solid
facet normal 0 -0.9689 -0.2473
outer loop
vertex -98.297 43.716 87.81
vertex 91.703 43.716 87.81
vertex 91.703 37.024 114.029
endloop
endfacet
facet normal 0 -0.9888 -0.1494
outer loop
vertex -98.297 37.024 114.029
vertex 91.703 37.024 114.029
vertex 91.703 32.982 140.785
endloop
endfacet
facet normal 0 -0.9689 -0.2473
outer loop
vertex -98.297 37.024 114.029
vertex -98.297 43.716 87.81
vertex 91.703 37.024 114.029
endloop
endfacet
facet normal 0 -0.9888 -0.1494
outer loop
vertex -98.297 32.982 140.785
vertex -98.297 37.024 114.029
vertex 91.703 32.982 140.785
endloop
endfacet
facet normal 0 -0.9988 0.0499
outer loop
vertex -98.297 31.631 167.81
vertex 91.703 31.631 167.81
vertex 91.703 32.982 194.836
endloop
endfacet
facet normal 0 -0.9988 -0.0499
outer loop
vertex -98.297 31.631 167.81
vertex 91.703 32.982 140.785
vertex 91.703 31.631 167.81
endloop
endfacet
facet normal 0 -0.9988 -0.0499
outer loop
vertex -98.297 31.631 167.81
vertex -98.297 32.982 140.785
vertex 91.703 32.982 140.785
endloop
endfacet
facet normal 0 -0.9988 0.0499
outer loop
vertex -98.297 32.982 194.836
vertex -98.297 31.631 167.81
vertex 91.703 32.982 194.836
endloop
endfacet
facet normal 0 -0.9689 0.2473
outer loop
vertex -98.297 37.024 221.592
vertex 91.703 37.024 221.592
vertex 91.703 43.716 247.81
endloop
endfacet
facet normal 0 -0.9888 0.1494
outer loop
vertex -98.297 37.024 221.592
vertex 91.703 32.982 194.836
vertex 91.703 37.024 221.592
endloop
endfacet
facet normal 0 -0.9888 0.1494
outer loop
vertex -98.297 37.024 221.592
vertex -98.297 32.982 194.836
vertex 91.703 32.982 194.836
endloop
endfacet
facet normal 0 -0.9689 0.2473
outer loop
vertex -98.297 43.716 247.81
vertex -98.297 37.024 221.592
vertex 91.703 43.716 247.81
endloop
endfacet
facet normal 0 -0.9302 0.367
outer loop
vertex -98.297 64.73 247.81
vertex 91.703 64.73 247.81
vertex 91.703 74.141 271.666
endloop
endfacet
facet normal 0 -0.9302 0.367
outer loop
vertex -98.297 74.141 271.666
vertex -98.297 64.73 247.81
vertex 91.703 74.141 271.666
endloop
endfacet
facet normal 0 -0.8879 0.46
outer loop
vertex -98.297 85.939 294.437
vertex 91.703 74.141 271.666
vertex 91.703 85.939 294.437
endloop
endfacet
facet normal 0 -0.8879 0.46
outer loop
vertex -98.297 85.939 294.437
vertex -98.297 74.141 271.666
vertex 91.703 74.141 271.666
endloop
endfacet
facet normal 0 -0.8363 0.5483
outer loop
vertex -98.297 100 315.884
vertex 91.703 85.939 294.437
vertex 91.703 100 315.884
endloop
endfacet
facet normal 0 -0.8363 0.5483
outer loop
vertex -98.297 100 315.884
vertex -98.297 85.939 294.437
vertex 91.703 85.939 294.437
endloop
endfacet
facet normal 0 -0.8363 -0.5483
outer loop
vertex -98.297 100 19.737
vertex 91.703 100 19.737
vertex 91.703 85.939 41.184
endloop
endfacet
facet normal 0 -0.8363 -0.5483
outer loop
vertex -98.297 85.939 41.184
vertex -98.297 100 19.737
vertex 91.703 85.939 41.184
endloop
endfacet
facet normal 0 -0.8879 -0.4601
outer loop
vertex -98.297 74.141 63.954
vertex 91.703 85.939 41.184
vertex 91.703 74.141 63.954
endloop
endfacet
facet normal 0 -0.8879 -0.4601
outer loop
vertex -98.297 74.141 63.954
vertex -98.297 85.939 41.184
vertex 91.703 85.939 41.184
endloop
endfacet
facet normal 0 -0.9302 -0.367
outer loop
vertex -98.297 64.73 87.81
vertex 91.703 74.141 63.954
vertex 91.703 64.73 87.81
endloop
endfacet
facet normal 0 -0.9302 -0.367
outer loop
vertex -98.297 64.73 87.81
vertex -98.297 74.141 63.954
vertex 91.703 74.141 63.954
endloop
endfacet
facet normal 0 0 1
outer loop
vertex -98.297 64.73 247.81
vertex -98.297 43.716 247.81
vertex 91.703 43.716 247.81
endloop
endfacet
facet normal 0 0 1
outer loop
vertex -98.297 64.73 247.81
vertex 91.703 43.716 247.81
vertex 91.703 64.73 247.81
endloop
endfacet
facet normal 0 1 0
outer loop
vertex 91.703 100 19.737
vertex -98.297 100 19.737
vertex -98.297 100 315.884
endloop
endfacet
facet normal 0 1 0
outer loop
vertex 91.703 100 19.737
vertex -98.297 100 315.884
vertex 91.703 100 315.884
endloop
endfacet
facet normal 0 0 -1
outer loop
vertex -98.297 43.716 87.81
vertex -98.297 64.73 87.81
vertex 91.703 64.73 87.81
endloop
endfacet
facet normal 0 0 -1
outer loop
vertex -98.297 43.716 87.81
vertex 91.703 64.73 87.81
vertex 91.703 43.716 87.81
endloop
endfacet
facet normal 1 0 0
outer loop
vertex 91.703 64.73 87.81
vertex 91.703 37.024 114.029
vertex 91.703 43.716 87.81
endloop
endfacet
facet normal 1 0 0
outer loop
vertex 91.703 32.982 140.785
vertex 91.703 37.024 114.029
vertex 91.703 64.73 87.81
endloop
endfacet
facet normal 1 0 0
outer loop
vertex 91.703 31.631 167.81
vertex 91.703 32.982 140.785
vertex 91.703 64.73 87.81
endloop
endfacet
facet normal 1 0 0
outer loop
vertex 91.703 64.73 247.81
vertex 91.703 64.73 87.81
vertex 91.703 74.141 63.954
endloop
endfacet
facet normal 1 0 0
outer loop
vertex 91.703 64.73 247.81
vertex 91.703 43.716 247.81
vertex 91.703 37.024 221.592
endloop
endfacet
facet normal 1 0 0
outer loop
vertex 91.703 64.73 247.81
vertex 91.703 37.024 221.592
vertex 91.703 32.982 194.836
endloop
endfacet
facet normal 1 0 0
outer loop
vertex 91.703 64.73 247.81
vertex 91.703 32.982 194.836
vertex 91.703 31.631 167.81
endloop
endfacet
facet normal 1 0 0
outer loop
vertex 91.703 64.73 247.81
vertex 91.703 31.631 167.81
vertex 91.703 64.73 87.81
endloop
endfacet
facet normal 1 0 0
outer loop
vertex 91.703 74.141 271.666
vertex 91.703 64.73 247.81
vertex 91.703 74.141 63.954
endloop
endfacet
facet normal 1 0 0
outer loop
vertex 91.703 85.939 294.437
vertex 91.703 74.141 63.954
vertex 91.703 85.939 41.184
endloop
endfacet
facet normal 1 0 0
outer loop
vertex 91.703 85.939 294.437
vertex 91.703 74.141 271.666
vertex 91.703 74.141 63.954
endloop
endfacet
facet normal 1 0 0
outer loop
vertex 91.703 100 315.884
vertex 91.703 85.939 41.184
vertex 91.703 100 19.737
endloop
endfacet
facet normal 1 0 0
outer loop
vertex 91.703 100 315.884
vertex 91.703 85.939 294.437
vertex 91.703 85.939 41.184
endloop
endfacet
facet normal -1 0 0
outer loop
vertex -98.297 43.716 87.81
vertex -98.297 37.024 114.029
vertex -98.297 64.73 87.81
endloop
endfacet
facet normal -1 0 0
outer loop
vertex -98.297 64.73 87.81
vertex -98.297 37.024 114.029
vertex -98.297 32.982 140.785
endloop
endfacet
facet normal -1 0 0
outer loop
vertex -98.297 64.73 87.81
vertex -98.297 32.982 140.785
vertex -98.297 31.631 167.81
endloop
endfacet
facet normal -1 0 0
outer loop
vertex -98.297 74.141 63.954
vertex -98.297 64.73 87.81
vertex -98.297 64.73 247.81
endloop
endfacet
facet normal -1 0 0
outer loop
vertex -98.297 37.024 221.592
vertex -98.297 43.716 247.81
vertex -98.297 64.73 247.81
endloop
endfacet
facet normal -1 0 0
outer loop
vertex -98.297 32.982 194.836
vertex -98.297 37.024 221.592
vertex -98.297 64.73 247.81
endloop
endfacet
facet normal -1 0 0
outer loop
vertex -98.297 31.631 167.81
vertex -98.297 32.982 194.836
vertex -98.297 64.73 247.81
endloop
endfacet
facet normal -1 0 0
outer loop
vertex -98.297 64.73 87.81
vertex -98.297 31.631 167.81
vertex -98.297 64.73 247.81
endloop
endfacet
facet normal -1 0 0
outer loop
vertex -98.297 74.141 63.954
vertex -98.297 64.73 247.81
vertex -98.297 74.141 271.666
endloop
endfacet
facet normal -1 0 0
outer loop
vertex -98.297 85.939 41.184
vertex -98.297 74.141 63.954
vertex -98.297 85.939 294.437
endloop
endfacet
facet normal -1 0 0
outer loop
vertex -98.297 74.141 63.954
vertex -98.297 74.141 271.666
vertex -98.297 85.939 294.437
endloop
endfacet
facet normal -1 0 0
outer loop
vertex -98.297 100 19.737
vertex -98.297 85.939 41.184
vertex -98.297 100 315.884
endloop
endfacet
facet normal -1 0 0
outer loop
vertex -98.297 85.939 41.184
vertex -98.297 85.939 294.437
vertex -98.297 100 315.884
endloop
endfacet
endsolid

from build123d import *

# Parameters (mm, degrees)
SKETCH1_W           = 200
SKETCH1_H           = 200
BOSS_EXTRUDE1_DEPTH = 340
CAVITY1_START       = -100
CAVITY1_DEPTH       = 200
CAVITY1_START_2     = 91.703376511
CAVITY1_2_DEPTH     = 8.296623489
CAVITY1_3_DEPTH     = 1.703376511


# Read off the part's stored shape, not the designer's step: Cavity1
with BuildPart() as part:
    # Sketch1 → Boss-Extrude1 (new body)
    with BuildSketch(Plane.XY):
        Rectangle(SKETCH1_W, SKETCH1_H)
    extrude(amount=BOSS_EXTRUDE1_DEPTH)

    # Cavity1 outline → Cavity1 (cut)
    with BuildSketch(Plane.YZ.offset(CAVITY1_START)):
        with BuildLine():
            ThreePointArc((100, 19.737266788), (79.748929914, 52.418363447), (64.730256288, 87.81044393))
            Line((64.730256288, 87.81044393), (43.715736742, 87.81044393))
            ThreePointArc((43.715736742, 87.81044393), (31.630726001, 167.81044393), (43.715736742, 247.81044393))
            Line((43.715736742, 247.81044393), (64.730256288, 247.81044393))
            ThreePointArc((64.730256288, 247.81044393), (79.748929914, 283.202524413), (100, 315.883621072))
            Line((100, 315.883621072), (100, 340))
            Line((100, 340), (-100, 340))
            Line((-100, 340), (-100, 0))
            Line((-100, 0), (100, 0))
            Line((100, 0), (100, 19.737266788))
        make_face()
    extrude(amount=CAVITY1_DEPTH, mode=Mode.SUBTRACT)

    # Cavity1 2 outline → Cavity1 2 (cut)
    with BuildSketch(Plane.YZ.offset(CAVITY1_START_2)):
        with BuildLine():
            Line((43.715736742, 87.81044393), (64.730256288, 87.81044393))
            ThreePointArc((64.730256288, 87.81044393), (79.748929914, 52.418363447), (100, 19.737266788))
            Line((100, 19.737266788), (100, 315.883621072))
            ThreePointArc((100, 315.883621072), (79.748929914, 283.202524413), (64.730256288, 247.81044393))
            Line((64.730256288, 247.81044393), (43.715736742, 247.81044393))
            ThreePointArc((43.715736742, 247.81044393), (31.630726001, 167.81044393), (43.715736742, 87.81044393))
        make_face()
    extrude(amount=CAVITY1_2_DEPTH, mode=Mode.SUBTRACT)

    # Cavity1 3 outline → Cavity1 3 (cut)
    with BuildSketch(Plane.YZ.offset(CAVITY1_START)):
        with BuildLine():
            Line((43.715736742, 87.81044393), (64.730256288, 87.81044393))
            ThreePointArc((64.730256288, 87.81044393), (79.748929914, 52.418363447), (100, 19.737266788))
            Line((100, 19.737266788), (100, 315.883621072))
            ThreePointArc((100, 315.883621072), (79.748929914, 283.202524413), (64.730256288, 247.81044393))
            Line((64.730256288, 247.81044393), (43.715736742, 247.81044393))
            ThreePointArc((43.715736742, 247.81044393), (31.630726001, 167.81044393), (43.715736742, 87.81044393))
        make_face()
    extrude(amount=CAVITY1_3_DEPTH, mode=Mode.SUBTRACT)


solid = part.part
